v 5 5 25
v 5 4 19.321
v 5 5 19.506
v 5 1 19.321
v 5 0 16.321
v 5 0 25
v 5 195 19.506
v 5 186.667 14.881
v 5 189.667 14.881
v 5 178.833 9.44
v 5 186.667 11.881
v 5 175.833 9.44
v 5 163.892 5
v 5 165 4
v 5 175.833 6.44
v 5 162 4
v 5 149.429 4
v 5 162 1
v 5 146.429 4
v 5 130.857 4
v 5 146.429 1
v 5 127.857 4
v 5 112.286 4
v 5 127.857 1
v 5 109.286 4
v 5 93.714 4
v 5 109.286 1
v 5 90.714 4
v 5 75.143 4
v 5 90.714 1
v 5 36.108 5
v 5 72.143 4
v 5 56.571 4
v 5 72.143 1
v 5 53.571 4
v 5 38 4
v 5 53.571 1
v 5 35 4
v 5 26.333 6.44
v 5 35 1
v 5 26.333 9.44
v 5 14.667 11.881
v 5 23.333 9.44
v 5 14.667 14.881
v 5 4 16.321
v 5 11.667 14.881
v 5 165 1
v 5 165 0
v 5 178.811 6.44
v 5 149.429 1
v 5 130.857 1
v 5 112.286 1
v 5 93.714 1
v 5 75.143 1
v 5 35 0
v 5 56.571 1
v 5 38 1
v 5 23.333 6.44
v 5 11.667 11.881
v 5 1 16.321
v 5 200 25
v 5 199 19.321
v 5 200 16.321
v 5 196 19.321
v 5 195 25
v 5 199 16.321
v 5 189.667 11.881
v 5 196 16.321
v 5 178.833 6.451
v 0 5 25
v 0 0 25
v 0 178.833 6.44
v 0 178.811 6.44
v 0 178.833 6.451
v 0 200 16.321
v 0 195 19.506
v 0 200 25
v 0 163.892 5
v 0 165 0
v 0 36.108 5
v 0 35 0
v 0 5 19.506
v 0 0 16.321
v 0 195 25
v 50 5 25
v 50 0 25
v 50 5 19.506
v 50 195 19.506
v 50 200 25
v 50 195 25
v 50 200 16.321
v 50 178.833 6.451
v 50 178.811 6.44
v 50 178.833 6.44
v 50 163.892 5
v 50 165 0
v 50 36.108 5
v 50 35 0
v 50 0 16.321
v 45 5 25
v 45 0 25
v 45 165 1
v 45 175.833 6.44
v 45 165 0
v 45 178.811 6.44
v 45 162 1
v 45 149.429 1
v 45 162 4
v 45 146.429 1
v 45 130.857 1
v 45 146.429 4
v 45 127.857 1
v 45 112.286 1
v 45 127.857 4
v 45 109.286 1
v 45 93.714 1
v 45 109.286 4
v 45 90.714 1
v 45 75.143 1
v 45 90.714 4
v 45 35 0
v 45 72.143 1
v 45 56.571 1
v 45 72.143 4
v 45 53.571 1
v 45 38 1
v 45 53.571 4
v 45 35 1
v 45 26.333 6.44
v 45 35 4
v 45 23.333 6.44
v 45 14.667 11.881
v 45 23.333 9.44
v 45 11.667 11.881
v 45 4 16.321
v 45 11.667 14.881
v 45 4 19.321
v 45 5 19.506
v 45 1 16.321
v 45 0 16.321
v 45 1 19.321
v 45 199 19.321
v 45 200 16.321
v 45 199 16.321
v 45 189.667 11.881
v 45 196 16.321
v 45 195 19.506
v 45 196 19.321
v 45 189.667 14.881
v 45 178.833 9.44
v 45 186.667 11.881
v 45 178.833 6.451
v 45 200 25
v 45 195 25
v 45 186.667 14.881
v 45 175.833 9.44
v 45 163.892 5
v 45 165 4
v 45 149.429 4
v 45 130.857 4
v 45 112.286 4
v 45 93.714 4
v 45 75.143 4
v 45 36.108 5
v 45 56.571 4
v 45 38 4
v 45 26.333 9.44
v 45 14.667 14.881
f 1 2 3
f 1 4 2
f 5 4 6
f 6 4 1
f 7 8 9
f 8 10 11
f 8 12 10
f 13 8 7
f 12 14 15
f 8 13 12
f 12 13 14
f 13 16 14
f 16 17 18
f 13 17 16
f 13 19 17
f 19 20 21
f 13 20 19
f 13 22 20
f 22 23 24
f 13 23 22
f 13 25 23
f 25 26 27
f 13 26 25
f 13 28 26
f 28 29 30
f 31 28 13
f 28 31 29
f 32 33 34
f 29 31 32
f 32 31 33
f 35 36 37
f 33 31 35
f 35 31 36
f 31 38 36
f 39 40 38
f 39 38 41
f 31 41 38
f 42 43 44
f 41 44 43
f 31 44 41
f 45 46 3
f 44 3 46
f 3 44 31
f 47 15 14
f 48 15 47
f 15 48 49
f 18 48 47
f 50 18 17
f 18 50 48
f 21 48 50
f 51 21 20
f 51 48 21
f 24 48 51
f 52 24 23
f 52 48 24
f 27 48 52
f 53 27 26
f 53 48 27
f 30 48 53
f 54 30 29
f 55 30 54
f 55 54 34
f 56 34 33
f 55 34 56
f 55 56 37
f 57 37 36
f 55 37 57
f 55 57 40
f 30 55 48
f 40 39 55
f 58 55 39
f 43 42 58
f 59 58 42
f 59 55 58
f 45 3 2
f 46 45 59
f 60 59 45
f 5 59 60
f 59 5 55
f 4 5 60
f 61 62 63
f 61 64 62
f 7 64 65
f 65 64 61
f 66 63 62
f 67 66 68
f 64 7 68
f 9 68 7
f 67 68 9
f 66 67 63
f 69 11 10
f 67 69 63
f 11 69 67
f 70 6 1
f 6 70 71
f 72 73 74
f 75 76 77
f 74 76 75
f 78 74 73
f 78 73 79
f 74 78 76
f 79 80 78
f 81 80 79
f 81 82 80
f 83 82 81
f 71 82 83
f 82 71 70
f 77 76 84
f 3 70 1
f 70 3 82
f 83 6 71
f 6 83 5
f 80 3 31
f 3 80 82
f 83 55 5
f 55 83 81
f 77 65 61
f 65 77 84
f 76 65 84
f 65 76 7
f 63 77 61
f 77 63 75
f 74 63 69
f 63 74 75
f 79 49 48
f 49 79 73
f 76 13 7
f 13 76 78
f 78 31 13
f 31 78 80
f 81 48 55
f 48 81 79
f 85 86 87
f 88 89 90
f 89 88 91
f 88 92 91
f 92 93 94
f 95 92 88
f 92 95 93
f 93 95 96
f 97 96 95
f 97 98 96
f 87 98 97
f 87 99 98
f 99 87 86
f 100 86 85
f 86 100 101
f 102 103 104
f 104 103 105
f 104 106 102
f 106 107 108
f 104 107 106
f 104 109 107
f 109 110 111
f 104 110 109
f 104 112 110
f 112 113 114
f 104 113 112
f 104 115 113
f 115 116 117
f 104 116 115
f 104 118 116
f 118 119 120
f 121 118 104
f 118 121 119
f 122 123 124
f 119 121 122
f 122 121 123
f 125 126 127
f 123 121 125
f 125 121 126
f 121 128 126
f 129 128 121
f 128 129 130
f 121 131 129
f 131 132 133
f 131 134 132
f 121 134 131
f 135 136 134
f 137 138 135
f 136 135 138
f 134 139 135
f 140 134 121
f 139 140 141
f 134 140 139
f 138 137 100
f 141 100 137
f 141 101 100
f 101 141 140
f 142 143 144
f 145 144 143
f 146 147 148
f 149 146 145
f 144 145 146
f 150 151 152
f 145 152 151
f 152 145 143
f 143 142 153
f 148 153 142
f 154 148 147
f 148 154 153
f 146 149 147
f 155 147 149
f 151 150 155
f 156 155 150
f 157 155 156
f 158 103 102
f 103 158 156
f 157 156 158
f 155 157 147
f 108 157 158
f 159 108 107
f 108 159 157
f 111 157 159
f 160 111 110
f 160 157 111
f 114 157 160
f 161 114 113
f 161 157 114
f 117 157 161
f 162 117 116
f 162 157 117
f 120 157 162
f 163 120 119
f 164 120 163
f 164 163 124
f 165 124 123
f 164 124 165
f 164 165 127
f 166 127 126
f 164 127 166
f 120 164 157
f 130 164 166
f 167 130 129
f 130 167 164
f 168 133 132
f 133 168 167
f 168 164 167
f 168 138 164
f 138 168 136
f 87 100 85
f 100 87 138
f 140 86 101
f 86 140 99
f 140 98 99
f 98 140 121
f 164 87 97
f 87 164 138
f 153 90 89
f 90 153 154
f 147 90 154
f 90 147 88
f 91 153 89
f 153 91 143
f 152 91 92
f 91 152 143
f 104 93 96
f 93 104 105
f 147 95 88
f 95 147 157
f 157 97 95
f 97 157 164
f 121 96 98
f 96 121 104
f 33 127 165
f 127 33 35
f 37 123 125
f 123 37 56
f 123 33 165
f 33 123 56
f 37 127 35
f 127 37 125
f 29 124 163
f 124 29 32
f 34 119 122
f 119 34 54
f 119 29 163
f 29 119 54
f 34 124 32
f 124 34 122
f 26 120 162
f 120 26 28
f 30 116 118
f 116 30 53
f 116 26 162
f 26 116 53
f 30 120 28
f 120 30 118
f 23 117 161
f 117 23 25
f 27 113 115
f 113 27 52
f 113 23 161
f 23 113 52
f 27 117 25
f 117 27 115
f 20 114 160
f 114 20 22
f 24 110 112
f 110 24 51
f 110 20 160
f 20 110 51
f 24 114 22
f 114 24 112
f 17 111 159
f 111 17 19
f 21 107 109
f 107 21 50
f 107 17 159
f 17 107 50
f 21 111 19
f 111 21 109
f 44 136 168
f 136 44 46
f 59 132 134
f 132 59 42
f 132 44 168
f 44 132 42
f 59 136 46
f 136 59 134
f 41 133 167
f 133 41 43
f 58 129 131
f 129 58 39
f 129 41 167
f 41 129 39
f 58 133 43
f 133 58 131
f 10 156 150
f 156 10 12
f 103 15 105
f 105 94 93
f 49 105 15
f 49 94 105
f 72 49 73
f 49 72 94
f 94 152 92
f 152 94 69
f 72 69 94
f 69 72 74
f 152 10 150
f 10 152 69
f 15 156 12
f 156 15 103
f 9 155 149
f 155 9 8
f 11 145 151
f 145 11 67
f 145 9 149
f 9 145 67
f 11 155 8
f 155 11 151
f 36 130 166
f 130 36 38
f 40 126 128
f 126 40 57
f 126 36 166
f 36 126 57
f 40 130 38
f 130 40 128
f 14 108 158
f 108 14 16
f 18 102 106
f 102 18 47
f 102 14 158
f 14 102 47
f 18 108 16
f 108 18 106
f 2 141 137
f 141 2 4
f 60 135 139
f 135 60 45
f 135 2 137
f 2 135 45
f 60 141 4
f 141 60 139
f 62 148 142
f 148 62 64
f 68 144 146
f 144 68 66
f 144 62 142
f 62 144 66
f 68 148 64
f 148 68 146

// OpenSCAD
// Overall dimensions
total_len = 200;
total_height = 25;
total_width = 50;

// Side rail dimensions.
rail_thickness = 5;
// The angle the rail end turns before going 90deg
railend_angle = 25;
// The overall length between the angled turn and the end of the model.
railend_len = 35;

// Rung dimensions. Rungs are alaways centred, and there is always one at the corners of the siderails.
rung_thickness = 3;
// nuber of rungs in the main ladder length, not including
// corner rungs.
rung_maincount = 6;
// number of rungs in the end section (each). This doesn't
// include the corner rungs.
rung_endcount = 2;

// Here be dwagons.

module railend()
{
    
    // the side opposite railend_angle
    railend_zoffset = tan(railend_angle) * railend_len;
    railend_hyplen = sqrt(railend_zoffset^2 + railend_len^2);
    
    // The end of the wee legs
    translate ([0,0,railend_zoffset])
        cube([rail_thickness, rail_thickness, (total_height - railend_zoffset)]);
    
    // The angled bit.    
    translate([0, railend_len, 0])
    rotate(a=[90-railend_angle,0,0]) 
        cube([rail_thickness, rail_thickness, railend_hyplen]);
}

module siderail()
{
    railend();

    translate([0,railend_len,0]) 
    cube([rail_thickness,(total_len - (2*railend_len)),rail_thickness]);

    translate([rail_thickness,total_len,0])
        rotate([0,0,180])
        railend();
}

module rungs(count, ystart, yend, zstart, zend)
{
    for (i = [1 : count])
    {
        echo(i);
        start = railend_len;
        end = total_len-railend_len-rail_thickness;
        rung_yoffset = (yend - ystart) / (count+1);
        rung_zoffset = (zend - zstart) / (count+1);
        echo (ystart+(i*rung_yoffset));
        translate([0,ystart+(i*rung_yoffset), zstart+(i*rung_zoffset) + rungdiff])
            cube([total_width, rung_thickness, rung_thickness]);
    }
}
// The two side rails
siderail();
translate([50-rail_thickness, 0, 0]) siderail();

// The "mandatory" rungs at turning points in the side rails

rungdiff = (rail_thickness-rung_thickness)/2;

translate([0, railend_len, rungdiff])
    cube([total_width, rung_thickness, rung_thickness]);

translate([0, total_len-railend_len-rung_thickness, rungdiff])
    cube([total_width, rung_thickness, rung_thickness]);

translate([0,rungdiff,tan(railend_angle) * railend_len])
    cube([total_width, rung_thickness, rung_thickness]);
    
translate([0,total_len-rung_thickness-rungdiff,tan(railend_angle) * railend_len])
    cube([total_width, rung_thickness, rung_thickness]);  

// Main length rungs
rungs(rung_maincount, railend_len, total_len-railend_len, 0,0);

// End rail rungs
rungs(rung_endcount, 0, railend_len, tan(railend_angle) * railend_len, 0);
rungs(rung_endcount, total_len-railend_len, total_len-(rail_thickness/2), 0, tan(railend_angle) * railend_len);
